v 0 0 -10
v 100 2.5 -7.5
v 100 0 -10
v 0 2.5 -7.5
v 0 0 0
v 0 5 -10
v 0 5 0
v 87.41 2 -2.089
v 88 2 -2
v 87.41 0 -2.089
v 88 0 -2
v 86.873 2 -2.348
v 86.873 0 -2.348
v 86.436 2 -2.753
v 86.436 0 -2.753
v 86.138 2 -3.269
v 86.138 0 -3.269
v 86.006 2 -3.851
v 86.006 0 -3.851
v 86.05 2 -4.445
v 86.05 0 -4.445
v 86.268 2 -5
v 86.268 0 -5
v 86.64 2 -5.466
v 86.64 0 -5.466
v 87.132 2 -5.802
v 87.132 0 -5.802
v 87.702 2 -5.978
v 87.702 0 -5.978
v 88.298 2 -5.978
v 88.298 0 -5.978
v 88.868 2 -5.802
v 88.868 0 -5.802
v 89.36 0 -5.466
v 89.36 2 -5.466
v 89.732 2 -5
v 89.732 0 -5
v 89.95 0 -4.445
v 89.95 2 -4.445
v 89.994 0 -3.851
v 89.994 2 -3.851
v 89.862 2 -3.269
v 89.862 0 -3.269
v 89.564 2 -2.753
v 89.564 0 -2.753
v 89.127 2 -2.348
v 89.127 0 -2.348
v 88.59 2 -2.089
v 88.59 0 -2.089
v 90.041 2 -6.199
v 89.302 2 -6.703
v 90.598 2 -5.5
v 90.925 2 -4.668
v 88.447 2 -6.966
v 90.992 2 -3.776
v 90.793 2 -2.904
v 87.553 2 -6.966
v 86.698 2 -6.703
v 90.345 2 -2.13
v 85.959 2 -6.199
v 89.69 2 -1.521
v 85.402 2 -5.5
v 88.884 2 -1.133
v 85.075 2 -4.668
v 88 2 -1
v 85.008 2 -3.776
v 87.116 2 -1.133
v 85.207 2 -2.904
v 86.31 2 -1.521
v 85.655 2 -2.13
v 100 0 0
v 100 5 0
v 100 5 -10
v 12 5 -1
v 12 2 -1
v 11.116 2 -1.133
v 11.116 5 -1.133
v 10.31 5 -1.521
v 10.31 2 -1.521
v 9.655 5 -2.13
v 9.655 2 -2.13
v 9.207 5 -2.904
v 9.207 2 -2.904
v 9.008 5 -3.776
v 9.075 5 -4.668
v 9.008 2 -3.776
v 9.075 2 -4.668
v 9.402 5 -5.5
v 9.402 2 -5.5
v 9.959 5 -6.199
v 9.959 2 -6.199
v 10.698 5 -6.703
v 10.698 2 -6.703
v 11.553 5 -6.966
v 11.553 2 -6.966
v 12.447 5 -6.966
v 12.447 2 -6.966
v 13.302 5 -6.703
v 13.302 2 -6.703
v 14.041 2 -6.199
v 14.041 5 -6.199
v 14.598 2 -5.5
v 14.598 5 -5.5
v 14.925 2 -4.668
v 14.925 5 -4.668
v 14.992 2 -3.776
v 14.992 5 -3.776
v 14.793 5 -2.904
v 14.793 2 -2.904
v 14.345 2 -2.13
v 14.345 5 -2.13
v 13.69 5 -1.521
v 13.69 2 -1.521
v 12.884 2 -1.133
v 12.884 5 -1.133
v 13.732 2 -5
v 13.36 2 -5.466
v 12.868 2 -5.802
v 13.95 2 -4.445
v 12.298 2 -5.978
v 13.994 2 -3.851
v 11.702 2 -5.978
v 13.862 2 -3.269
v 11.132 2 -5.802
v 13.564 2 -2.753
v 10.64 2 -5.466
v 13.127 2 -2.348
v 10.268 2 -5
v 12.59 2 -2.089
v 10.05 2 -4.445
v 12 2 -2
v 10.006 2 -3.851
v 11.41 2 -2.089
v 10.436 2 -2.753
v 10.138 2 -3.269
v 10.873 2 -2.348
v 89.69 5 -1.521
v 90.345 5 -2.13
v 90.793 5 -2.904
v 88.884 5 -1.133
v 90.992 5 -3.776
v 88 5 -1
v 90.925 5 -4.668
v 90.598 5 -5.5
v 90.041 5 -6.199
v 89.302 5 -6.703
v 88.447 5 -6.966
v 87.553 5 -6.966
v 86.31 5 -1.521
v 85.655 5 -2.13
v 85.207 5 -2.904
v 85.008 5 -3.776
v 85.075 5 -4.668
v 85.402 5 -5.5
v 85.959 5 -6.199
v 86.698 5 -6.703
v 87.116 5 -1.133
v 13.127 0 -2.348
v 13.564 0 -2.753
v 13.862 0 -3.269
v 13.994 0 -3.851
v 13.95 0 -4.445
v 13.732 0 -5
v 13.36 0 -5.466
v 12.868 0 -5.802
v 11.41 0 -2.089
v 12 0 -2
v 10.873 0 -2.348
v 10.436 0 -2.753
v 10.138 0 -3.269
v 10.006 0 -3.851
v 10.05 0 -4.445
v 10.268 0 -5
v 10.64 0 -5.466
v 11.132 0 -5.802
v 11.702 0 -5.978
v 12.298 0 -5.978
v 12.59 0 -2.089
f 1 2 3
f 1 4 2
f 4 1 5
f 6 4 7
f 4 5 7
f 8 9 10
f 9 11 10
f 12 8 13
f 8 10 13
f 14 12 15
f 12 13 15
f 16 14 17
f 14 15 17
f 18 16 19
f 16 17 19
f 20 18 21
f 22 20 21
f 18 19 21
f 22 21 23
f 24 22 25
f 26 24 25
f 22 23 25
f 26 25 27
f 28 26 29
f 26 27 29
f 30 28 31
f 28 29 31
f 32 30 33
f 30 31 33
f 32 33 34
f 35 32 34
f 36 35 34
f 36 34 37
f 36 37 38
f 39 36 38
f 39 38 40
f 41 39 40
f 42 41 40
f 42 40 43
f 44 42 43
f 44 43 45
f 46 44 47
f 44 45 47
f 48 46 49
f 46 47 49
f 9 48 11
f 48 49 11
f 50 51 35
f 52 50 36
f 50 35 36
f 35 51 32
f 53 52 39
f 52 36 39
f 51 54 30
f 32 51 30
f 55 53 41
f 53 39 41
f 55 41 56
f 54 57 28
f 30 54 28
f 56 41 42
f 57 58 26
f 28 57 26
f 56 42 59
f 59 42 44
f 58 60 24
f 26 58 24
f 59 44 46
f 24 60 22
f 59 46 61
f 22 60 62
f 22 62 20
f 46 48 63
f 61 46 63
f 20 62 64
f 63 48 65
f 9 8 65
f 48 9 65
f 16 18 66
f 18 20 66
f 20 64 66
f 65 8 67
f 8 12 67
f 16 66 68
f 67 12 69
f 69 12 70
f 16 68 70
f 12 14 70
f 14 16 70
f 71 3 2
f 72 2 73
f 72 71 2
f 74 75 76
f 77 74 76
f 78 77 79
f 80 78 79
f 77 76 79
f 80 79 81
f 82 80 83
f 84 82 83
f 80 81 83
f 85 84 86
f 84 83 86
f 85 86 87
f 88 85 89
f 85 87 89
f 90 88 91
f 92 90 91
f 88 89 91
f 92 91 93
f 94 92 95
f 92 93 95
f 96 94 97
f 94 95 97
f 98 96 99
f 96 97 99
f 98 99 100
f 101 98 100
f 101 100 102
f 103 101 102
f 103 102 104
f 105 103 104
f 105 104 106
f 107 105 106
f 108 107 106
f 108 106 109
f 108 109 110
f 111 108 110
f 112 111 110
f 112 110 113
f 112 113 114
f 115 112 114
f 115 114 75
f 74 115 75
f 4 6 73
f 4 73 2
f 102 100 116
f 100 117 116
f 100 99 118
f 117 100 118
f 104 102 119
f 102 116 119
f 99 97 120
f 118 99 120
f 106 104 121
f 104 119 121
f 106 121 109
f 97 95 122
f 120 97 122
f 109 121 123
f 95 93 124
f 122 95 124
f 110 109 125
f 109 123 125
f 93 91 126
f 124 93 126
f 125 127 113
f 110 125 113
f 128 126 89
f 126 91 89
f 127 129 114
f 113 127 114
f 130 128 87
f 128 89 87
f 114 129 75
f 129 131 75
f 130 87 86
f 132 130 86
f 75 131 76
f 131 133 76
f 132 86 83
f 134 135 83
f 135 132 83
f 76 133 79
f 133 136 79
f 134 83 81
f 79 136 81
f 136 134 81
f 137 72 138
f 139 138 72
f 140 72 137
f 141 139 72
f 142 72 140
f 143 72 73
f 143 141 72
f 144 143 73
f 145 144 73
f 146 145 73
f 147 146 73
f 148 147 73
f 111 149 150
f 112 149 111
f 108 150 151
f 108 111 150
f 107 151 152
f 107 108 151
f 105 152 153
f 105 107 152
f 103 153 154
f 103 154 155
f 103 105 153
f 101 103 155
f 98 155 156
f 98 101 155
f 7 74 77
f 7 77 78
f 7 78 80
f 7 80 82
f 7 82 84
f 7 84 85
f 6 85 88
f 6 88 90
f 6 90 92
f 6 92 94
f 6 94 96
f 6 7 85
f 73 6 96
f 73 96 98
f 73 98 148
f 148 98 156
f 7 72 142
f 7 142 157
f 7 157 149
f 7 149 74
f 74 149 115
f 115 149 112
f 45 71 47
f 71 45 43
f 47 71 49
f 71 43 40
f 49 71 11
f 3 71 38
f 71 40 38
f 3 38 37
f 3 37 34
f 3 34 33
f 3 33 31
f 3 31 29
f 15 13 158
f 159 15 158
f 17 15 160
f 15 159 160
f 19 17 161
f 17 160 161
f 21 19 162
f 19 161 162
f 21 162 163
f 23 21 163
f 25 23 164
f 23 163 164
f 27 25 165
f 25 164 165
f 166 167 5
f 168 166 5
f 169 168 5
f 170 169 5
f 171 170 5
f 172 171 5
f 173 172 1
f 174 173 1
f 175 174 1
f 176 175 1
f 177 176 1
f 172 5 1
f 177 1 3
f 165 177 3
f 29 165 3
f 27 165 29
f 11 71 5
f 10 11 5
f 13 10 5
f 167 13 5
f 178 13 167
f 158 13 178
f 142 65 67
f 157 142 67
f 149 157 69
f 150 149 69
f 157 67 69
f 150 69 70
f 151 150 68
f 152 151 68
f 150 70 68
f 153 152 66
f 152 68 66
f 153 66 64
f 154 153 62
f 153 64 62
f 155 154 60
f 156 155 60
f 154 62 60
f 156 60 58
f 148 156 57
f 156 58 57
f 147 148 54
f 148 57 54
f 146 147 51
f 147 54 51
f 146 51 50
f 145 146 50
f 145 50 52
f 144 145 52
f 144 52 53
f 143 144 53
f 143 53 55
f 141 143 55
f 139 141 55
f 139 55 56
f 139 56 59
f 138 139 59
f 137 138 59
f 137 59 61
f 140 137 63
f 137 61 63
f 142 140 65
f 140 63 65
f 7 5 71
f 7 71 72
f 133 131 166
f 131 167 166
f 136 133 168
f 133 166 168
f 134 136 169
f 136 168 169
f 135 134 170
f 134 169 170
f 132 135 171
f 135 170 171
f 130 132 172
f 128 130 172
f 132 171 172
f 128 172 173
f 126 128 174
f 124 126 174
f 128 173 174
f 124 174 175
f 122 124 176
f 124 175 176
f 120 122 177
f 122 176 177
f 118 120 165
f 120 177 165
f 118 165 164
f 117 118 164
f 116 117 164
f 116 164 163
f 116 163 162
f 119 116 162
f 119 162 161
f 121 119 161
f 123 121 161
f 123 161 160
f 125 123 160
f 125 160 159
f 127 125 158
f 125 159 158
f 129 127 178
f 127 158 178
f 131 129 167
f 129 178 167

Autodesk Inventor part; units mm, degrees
ref_plane "YZ Plane" through (0, 0, 0) normal (1, 0, 0) x (0, 1, 0)
ref_plane "XZ Plane" through (0, 0, 0) normal (0, 1, 0) x (-1, 0, 0)
ref_plane "XY Plane" through (0, 0, 0) normal (0, 0, 1) x (1, 0, 0)
sketch "Sketch1" plane through (0, 0, 0) normal (1, 0, 0) x (0, 1, 0)
  line L0 (0, 0) -> (5, 0)
  line L1 (5, 0) -> (5, -10)
  line L2 (5, -10) -> (2.5, -7.5)
  line L3 (2.5, -7.5) -> (0, -10)
  line L4 (0, 0) -> (0, -10)
  line L5 (2.5, -7.5) -> (2.5, -12.5) construction
  circle A0 centre (2.5, -10.3284) radius 2 construction
  line L6 (2.5, -10.3284) -> (1.25, -10.3284) construction
  line L7 (5, -10.6569) -> (2.5, -13.1569) construction
  line L8 (2.5, -13.1569) -> (0, -10.6569) construction
  dimension "d0" = 5
  dimension "d3" = 10
  dimension "d4" = 4
  dimension "d33" = 0.6569
  dimension "d34" = 5.6569
  dimension "d35" = 2.8284
extrude "Extrusion1" add sketch "Sketch1" along normal blind 100
sketch "Sketch2" plane through (0, 5, 0) normal (0, 1, 0) x (1, 0, 0)
  line L0 (0, 10) -> (0, 0) construction
  line L1 (0, 0) -> (100, 0) construction
  line L2 (0, 10) -> (100, 10) construction
  line L3 (12, 0) -> (12, 10) construction
  line L4 (50, 0) -> (50, 15) construction
  circle A0 centre (12, 4) radius 2
  circle A1 centre (88, 4) radius 2
  point P0 (0, 5)
  dimension "d8" = 10
  dimension "d10" = 12
  dimension "d12" = 15
  dimension "d13" = 50
  dimension "d14" = 4
  dimension "d15" = 4
hole "Hole1" at (12, 5, -4) direction (0, -1, 0) diameter 4 end through all counterbore diameter 6 counterbore depth 3
hole "Hole2" at (88, 5, -4) direction (0, -1, 0) diameter 4 end through all counterbore diameter 6 counterbore depth 3
sketch "Sketch3" plane through (100, 0, 0) normal (1, 0, 0) x (0, 0, -1)
  line L0 (0, 5) -> (0, 0) projected
  line L1 (0, 2.5) -> (3, 2.5) construction
  circle A0 centre (3, 2.5) radius 1.6
  dimension "d36" = 3
  dimension "d37" = 3.2
hole "Hole3" [suppressed]
chamfer "Chamfer2" [suppressed]
sketch "Sketch4" plane through (0, 0, 0) normal (-1, 0, 0) x (0, 0, 1)
  line L0 (0, 5) -> (0, 0) projected
  circle A0 centre (-3, 2.5) radius 1.7294 projected
  line L1 (0, 2.5) -> (-3, 2.5)
  circle A1 centre (-3, 2.5) radius 1.6
  line L2 (0, 5) -> (0, 0) projected
  dimension "d48" = 3.2
  dimension "d59" = 3
hole "Hole4" [suppressed]
chamfer "Chamfer3" [suppressed]
properties part number "K-tor-kulek" material "Steel, High Strength, Low Alloy"
